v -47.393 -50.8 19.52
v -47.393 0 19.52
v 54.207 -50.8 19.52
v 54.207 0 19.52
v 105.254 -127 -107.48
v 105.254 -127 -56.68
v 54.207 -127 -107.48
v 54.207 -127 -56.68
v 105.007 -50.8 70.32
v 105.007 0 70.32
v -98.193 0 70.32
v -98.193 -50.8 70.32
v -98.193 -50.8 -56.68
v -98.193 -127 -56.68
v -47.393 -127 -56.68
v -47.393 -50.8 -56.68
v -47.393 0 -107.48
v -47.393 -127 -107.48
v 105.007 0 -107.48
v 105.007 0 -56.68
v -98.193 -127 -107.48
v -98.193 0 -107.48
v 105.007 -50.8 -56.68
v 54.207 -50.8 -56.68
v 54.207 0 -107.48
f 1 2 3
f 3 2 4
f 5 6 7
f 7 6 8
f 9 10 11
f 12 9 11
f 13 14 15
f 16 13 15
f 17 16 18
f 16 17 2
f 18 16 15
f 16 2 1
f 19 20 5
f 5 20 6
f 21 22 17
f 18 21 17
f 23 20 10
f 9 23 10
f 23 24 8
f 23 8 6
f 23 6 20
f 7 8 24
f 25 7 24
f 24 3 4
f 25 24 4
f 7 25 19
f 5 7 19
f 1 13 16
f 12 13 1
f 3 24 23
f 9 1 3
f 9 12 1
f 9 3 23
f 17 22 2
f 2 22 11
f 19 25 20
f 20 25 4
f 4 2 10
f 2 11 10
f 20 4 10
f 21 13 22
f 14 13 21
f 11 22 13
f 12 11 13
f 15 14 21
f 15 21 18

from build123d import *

# Parameters (mm, degrees)
F1_DEPTH = 50.8
F2_W     = 50.8
F2_H     = 127
F3_DEPTH = 50.8
F5_DEPTH = 50.8


with BuildPart() as f1:
    # F0 (on Front) → F1 (new body)
    with BuildSketch(Plane.XZ):
        Polygon((-98.19336, 70.319961), (-98.19336, -56.680039), (-47.39336, -56.680039), (-47.39336, 19.519961), (54.20664, 19.519961), (54.20664, -56.680039), (105.00664, -56.680039), (105.00664, 70.319961), align=None)
    extrude(amount=F1_DEPTH)

    # F2 (on face) → F3 (join)
    with BuildSketch(Plane(origin=(0, 0, -56.680039), x_dir=(1, 0, 0), z_dir=(0, 0, -1))):
        with Locations((-72.79336, 63.5)):
            Rectangle(F2_W, F2_H)
    extrude(amount=F3_DEPTH)

    # F4 (on face) → F5 (join)
    with BuildSketch(Plane(origin=(0, 0, -56.680039), x_dir=(1, 0, 0), z_dir=(0, 0, -1))):
        Polygon((54.20664, 126.999759), (54.20664, 0), (105.00664, 0), (105.254231, 126.999759), align=None)
    extrude(amount=F5_DEPTH)


solid = f1.part
